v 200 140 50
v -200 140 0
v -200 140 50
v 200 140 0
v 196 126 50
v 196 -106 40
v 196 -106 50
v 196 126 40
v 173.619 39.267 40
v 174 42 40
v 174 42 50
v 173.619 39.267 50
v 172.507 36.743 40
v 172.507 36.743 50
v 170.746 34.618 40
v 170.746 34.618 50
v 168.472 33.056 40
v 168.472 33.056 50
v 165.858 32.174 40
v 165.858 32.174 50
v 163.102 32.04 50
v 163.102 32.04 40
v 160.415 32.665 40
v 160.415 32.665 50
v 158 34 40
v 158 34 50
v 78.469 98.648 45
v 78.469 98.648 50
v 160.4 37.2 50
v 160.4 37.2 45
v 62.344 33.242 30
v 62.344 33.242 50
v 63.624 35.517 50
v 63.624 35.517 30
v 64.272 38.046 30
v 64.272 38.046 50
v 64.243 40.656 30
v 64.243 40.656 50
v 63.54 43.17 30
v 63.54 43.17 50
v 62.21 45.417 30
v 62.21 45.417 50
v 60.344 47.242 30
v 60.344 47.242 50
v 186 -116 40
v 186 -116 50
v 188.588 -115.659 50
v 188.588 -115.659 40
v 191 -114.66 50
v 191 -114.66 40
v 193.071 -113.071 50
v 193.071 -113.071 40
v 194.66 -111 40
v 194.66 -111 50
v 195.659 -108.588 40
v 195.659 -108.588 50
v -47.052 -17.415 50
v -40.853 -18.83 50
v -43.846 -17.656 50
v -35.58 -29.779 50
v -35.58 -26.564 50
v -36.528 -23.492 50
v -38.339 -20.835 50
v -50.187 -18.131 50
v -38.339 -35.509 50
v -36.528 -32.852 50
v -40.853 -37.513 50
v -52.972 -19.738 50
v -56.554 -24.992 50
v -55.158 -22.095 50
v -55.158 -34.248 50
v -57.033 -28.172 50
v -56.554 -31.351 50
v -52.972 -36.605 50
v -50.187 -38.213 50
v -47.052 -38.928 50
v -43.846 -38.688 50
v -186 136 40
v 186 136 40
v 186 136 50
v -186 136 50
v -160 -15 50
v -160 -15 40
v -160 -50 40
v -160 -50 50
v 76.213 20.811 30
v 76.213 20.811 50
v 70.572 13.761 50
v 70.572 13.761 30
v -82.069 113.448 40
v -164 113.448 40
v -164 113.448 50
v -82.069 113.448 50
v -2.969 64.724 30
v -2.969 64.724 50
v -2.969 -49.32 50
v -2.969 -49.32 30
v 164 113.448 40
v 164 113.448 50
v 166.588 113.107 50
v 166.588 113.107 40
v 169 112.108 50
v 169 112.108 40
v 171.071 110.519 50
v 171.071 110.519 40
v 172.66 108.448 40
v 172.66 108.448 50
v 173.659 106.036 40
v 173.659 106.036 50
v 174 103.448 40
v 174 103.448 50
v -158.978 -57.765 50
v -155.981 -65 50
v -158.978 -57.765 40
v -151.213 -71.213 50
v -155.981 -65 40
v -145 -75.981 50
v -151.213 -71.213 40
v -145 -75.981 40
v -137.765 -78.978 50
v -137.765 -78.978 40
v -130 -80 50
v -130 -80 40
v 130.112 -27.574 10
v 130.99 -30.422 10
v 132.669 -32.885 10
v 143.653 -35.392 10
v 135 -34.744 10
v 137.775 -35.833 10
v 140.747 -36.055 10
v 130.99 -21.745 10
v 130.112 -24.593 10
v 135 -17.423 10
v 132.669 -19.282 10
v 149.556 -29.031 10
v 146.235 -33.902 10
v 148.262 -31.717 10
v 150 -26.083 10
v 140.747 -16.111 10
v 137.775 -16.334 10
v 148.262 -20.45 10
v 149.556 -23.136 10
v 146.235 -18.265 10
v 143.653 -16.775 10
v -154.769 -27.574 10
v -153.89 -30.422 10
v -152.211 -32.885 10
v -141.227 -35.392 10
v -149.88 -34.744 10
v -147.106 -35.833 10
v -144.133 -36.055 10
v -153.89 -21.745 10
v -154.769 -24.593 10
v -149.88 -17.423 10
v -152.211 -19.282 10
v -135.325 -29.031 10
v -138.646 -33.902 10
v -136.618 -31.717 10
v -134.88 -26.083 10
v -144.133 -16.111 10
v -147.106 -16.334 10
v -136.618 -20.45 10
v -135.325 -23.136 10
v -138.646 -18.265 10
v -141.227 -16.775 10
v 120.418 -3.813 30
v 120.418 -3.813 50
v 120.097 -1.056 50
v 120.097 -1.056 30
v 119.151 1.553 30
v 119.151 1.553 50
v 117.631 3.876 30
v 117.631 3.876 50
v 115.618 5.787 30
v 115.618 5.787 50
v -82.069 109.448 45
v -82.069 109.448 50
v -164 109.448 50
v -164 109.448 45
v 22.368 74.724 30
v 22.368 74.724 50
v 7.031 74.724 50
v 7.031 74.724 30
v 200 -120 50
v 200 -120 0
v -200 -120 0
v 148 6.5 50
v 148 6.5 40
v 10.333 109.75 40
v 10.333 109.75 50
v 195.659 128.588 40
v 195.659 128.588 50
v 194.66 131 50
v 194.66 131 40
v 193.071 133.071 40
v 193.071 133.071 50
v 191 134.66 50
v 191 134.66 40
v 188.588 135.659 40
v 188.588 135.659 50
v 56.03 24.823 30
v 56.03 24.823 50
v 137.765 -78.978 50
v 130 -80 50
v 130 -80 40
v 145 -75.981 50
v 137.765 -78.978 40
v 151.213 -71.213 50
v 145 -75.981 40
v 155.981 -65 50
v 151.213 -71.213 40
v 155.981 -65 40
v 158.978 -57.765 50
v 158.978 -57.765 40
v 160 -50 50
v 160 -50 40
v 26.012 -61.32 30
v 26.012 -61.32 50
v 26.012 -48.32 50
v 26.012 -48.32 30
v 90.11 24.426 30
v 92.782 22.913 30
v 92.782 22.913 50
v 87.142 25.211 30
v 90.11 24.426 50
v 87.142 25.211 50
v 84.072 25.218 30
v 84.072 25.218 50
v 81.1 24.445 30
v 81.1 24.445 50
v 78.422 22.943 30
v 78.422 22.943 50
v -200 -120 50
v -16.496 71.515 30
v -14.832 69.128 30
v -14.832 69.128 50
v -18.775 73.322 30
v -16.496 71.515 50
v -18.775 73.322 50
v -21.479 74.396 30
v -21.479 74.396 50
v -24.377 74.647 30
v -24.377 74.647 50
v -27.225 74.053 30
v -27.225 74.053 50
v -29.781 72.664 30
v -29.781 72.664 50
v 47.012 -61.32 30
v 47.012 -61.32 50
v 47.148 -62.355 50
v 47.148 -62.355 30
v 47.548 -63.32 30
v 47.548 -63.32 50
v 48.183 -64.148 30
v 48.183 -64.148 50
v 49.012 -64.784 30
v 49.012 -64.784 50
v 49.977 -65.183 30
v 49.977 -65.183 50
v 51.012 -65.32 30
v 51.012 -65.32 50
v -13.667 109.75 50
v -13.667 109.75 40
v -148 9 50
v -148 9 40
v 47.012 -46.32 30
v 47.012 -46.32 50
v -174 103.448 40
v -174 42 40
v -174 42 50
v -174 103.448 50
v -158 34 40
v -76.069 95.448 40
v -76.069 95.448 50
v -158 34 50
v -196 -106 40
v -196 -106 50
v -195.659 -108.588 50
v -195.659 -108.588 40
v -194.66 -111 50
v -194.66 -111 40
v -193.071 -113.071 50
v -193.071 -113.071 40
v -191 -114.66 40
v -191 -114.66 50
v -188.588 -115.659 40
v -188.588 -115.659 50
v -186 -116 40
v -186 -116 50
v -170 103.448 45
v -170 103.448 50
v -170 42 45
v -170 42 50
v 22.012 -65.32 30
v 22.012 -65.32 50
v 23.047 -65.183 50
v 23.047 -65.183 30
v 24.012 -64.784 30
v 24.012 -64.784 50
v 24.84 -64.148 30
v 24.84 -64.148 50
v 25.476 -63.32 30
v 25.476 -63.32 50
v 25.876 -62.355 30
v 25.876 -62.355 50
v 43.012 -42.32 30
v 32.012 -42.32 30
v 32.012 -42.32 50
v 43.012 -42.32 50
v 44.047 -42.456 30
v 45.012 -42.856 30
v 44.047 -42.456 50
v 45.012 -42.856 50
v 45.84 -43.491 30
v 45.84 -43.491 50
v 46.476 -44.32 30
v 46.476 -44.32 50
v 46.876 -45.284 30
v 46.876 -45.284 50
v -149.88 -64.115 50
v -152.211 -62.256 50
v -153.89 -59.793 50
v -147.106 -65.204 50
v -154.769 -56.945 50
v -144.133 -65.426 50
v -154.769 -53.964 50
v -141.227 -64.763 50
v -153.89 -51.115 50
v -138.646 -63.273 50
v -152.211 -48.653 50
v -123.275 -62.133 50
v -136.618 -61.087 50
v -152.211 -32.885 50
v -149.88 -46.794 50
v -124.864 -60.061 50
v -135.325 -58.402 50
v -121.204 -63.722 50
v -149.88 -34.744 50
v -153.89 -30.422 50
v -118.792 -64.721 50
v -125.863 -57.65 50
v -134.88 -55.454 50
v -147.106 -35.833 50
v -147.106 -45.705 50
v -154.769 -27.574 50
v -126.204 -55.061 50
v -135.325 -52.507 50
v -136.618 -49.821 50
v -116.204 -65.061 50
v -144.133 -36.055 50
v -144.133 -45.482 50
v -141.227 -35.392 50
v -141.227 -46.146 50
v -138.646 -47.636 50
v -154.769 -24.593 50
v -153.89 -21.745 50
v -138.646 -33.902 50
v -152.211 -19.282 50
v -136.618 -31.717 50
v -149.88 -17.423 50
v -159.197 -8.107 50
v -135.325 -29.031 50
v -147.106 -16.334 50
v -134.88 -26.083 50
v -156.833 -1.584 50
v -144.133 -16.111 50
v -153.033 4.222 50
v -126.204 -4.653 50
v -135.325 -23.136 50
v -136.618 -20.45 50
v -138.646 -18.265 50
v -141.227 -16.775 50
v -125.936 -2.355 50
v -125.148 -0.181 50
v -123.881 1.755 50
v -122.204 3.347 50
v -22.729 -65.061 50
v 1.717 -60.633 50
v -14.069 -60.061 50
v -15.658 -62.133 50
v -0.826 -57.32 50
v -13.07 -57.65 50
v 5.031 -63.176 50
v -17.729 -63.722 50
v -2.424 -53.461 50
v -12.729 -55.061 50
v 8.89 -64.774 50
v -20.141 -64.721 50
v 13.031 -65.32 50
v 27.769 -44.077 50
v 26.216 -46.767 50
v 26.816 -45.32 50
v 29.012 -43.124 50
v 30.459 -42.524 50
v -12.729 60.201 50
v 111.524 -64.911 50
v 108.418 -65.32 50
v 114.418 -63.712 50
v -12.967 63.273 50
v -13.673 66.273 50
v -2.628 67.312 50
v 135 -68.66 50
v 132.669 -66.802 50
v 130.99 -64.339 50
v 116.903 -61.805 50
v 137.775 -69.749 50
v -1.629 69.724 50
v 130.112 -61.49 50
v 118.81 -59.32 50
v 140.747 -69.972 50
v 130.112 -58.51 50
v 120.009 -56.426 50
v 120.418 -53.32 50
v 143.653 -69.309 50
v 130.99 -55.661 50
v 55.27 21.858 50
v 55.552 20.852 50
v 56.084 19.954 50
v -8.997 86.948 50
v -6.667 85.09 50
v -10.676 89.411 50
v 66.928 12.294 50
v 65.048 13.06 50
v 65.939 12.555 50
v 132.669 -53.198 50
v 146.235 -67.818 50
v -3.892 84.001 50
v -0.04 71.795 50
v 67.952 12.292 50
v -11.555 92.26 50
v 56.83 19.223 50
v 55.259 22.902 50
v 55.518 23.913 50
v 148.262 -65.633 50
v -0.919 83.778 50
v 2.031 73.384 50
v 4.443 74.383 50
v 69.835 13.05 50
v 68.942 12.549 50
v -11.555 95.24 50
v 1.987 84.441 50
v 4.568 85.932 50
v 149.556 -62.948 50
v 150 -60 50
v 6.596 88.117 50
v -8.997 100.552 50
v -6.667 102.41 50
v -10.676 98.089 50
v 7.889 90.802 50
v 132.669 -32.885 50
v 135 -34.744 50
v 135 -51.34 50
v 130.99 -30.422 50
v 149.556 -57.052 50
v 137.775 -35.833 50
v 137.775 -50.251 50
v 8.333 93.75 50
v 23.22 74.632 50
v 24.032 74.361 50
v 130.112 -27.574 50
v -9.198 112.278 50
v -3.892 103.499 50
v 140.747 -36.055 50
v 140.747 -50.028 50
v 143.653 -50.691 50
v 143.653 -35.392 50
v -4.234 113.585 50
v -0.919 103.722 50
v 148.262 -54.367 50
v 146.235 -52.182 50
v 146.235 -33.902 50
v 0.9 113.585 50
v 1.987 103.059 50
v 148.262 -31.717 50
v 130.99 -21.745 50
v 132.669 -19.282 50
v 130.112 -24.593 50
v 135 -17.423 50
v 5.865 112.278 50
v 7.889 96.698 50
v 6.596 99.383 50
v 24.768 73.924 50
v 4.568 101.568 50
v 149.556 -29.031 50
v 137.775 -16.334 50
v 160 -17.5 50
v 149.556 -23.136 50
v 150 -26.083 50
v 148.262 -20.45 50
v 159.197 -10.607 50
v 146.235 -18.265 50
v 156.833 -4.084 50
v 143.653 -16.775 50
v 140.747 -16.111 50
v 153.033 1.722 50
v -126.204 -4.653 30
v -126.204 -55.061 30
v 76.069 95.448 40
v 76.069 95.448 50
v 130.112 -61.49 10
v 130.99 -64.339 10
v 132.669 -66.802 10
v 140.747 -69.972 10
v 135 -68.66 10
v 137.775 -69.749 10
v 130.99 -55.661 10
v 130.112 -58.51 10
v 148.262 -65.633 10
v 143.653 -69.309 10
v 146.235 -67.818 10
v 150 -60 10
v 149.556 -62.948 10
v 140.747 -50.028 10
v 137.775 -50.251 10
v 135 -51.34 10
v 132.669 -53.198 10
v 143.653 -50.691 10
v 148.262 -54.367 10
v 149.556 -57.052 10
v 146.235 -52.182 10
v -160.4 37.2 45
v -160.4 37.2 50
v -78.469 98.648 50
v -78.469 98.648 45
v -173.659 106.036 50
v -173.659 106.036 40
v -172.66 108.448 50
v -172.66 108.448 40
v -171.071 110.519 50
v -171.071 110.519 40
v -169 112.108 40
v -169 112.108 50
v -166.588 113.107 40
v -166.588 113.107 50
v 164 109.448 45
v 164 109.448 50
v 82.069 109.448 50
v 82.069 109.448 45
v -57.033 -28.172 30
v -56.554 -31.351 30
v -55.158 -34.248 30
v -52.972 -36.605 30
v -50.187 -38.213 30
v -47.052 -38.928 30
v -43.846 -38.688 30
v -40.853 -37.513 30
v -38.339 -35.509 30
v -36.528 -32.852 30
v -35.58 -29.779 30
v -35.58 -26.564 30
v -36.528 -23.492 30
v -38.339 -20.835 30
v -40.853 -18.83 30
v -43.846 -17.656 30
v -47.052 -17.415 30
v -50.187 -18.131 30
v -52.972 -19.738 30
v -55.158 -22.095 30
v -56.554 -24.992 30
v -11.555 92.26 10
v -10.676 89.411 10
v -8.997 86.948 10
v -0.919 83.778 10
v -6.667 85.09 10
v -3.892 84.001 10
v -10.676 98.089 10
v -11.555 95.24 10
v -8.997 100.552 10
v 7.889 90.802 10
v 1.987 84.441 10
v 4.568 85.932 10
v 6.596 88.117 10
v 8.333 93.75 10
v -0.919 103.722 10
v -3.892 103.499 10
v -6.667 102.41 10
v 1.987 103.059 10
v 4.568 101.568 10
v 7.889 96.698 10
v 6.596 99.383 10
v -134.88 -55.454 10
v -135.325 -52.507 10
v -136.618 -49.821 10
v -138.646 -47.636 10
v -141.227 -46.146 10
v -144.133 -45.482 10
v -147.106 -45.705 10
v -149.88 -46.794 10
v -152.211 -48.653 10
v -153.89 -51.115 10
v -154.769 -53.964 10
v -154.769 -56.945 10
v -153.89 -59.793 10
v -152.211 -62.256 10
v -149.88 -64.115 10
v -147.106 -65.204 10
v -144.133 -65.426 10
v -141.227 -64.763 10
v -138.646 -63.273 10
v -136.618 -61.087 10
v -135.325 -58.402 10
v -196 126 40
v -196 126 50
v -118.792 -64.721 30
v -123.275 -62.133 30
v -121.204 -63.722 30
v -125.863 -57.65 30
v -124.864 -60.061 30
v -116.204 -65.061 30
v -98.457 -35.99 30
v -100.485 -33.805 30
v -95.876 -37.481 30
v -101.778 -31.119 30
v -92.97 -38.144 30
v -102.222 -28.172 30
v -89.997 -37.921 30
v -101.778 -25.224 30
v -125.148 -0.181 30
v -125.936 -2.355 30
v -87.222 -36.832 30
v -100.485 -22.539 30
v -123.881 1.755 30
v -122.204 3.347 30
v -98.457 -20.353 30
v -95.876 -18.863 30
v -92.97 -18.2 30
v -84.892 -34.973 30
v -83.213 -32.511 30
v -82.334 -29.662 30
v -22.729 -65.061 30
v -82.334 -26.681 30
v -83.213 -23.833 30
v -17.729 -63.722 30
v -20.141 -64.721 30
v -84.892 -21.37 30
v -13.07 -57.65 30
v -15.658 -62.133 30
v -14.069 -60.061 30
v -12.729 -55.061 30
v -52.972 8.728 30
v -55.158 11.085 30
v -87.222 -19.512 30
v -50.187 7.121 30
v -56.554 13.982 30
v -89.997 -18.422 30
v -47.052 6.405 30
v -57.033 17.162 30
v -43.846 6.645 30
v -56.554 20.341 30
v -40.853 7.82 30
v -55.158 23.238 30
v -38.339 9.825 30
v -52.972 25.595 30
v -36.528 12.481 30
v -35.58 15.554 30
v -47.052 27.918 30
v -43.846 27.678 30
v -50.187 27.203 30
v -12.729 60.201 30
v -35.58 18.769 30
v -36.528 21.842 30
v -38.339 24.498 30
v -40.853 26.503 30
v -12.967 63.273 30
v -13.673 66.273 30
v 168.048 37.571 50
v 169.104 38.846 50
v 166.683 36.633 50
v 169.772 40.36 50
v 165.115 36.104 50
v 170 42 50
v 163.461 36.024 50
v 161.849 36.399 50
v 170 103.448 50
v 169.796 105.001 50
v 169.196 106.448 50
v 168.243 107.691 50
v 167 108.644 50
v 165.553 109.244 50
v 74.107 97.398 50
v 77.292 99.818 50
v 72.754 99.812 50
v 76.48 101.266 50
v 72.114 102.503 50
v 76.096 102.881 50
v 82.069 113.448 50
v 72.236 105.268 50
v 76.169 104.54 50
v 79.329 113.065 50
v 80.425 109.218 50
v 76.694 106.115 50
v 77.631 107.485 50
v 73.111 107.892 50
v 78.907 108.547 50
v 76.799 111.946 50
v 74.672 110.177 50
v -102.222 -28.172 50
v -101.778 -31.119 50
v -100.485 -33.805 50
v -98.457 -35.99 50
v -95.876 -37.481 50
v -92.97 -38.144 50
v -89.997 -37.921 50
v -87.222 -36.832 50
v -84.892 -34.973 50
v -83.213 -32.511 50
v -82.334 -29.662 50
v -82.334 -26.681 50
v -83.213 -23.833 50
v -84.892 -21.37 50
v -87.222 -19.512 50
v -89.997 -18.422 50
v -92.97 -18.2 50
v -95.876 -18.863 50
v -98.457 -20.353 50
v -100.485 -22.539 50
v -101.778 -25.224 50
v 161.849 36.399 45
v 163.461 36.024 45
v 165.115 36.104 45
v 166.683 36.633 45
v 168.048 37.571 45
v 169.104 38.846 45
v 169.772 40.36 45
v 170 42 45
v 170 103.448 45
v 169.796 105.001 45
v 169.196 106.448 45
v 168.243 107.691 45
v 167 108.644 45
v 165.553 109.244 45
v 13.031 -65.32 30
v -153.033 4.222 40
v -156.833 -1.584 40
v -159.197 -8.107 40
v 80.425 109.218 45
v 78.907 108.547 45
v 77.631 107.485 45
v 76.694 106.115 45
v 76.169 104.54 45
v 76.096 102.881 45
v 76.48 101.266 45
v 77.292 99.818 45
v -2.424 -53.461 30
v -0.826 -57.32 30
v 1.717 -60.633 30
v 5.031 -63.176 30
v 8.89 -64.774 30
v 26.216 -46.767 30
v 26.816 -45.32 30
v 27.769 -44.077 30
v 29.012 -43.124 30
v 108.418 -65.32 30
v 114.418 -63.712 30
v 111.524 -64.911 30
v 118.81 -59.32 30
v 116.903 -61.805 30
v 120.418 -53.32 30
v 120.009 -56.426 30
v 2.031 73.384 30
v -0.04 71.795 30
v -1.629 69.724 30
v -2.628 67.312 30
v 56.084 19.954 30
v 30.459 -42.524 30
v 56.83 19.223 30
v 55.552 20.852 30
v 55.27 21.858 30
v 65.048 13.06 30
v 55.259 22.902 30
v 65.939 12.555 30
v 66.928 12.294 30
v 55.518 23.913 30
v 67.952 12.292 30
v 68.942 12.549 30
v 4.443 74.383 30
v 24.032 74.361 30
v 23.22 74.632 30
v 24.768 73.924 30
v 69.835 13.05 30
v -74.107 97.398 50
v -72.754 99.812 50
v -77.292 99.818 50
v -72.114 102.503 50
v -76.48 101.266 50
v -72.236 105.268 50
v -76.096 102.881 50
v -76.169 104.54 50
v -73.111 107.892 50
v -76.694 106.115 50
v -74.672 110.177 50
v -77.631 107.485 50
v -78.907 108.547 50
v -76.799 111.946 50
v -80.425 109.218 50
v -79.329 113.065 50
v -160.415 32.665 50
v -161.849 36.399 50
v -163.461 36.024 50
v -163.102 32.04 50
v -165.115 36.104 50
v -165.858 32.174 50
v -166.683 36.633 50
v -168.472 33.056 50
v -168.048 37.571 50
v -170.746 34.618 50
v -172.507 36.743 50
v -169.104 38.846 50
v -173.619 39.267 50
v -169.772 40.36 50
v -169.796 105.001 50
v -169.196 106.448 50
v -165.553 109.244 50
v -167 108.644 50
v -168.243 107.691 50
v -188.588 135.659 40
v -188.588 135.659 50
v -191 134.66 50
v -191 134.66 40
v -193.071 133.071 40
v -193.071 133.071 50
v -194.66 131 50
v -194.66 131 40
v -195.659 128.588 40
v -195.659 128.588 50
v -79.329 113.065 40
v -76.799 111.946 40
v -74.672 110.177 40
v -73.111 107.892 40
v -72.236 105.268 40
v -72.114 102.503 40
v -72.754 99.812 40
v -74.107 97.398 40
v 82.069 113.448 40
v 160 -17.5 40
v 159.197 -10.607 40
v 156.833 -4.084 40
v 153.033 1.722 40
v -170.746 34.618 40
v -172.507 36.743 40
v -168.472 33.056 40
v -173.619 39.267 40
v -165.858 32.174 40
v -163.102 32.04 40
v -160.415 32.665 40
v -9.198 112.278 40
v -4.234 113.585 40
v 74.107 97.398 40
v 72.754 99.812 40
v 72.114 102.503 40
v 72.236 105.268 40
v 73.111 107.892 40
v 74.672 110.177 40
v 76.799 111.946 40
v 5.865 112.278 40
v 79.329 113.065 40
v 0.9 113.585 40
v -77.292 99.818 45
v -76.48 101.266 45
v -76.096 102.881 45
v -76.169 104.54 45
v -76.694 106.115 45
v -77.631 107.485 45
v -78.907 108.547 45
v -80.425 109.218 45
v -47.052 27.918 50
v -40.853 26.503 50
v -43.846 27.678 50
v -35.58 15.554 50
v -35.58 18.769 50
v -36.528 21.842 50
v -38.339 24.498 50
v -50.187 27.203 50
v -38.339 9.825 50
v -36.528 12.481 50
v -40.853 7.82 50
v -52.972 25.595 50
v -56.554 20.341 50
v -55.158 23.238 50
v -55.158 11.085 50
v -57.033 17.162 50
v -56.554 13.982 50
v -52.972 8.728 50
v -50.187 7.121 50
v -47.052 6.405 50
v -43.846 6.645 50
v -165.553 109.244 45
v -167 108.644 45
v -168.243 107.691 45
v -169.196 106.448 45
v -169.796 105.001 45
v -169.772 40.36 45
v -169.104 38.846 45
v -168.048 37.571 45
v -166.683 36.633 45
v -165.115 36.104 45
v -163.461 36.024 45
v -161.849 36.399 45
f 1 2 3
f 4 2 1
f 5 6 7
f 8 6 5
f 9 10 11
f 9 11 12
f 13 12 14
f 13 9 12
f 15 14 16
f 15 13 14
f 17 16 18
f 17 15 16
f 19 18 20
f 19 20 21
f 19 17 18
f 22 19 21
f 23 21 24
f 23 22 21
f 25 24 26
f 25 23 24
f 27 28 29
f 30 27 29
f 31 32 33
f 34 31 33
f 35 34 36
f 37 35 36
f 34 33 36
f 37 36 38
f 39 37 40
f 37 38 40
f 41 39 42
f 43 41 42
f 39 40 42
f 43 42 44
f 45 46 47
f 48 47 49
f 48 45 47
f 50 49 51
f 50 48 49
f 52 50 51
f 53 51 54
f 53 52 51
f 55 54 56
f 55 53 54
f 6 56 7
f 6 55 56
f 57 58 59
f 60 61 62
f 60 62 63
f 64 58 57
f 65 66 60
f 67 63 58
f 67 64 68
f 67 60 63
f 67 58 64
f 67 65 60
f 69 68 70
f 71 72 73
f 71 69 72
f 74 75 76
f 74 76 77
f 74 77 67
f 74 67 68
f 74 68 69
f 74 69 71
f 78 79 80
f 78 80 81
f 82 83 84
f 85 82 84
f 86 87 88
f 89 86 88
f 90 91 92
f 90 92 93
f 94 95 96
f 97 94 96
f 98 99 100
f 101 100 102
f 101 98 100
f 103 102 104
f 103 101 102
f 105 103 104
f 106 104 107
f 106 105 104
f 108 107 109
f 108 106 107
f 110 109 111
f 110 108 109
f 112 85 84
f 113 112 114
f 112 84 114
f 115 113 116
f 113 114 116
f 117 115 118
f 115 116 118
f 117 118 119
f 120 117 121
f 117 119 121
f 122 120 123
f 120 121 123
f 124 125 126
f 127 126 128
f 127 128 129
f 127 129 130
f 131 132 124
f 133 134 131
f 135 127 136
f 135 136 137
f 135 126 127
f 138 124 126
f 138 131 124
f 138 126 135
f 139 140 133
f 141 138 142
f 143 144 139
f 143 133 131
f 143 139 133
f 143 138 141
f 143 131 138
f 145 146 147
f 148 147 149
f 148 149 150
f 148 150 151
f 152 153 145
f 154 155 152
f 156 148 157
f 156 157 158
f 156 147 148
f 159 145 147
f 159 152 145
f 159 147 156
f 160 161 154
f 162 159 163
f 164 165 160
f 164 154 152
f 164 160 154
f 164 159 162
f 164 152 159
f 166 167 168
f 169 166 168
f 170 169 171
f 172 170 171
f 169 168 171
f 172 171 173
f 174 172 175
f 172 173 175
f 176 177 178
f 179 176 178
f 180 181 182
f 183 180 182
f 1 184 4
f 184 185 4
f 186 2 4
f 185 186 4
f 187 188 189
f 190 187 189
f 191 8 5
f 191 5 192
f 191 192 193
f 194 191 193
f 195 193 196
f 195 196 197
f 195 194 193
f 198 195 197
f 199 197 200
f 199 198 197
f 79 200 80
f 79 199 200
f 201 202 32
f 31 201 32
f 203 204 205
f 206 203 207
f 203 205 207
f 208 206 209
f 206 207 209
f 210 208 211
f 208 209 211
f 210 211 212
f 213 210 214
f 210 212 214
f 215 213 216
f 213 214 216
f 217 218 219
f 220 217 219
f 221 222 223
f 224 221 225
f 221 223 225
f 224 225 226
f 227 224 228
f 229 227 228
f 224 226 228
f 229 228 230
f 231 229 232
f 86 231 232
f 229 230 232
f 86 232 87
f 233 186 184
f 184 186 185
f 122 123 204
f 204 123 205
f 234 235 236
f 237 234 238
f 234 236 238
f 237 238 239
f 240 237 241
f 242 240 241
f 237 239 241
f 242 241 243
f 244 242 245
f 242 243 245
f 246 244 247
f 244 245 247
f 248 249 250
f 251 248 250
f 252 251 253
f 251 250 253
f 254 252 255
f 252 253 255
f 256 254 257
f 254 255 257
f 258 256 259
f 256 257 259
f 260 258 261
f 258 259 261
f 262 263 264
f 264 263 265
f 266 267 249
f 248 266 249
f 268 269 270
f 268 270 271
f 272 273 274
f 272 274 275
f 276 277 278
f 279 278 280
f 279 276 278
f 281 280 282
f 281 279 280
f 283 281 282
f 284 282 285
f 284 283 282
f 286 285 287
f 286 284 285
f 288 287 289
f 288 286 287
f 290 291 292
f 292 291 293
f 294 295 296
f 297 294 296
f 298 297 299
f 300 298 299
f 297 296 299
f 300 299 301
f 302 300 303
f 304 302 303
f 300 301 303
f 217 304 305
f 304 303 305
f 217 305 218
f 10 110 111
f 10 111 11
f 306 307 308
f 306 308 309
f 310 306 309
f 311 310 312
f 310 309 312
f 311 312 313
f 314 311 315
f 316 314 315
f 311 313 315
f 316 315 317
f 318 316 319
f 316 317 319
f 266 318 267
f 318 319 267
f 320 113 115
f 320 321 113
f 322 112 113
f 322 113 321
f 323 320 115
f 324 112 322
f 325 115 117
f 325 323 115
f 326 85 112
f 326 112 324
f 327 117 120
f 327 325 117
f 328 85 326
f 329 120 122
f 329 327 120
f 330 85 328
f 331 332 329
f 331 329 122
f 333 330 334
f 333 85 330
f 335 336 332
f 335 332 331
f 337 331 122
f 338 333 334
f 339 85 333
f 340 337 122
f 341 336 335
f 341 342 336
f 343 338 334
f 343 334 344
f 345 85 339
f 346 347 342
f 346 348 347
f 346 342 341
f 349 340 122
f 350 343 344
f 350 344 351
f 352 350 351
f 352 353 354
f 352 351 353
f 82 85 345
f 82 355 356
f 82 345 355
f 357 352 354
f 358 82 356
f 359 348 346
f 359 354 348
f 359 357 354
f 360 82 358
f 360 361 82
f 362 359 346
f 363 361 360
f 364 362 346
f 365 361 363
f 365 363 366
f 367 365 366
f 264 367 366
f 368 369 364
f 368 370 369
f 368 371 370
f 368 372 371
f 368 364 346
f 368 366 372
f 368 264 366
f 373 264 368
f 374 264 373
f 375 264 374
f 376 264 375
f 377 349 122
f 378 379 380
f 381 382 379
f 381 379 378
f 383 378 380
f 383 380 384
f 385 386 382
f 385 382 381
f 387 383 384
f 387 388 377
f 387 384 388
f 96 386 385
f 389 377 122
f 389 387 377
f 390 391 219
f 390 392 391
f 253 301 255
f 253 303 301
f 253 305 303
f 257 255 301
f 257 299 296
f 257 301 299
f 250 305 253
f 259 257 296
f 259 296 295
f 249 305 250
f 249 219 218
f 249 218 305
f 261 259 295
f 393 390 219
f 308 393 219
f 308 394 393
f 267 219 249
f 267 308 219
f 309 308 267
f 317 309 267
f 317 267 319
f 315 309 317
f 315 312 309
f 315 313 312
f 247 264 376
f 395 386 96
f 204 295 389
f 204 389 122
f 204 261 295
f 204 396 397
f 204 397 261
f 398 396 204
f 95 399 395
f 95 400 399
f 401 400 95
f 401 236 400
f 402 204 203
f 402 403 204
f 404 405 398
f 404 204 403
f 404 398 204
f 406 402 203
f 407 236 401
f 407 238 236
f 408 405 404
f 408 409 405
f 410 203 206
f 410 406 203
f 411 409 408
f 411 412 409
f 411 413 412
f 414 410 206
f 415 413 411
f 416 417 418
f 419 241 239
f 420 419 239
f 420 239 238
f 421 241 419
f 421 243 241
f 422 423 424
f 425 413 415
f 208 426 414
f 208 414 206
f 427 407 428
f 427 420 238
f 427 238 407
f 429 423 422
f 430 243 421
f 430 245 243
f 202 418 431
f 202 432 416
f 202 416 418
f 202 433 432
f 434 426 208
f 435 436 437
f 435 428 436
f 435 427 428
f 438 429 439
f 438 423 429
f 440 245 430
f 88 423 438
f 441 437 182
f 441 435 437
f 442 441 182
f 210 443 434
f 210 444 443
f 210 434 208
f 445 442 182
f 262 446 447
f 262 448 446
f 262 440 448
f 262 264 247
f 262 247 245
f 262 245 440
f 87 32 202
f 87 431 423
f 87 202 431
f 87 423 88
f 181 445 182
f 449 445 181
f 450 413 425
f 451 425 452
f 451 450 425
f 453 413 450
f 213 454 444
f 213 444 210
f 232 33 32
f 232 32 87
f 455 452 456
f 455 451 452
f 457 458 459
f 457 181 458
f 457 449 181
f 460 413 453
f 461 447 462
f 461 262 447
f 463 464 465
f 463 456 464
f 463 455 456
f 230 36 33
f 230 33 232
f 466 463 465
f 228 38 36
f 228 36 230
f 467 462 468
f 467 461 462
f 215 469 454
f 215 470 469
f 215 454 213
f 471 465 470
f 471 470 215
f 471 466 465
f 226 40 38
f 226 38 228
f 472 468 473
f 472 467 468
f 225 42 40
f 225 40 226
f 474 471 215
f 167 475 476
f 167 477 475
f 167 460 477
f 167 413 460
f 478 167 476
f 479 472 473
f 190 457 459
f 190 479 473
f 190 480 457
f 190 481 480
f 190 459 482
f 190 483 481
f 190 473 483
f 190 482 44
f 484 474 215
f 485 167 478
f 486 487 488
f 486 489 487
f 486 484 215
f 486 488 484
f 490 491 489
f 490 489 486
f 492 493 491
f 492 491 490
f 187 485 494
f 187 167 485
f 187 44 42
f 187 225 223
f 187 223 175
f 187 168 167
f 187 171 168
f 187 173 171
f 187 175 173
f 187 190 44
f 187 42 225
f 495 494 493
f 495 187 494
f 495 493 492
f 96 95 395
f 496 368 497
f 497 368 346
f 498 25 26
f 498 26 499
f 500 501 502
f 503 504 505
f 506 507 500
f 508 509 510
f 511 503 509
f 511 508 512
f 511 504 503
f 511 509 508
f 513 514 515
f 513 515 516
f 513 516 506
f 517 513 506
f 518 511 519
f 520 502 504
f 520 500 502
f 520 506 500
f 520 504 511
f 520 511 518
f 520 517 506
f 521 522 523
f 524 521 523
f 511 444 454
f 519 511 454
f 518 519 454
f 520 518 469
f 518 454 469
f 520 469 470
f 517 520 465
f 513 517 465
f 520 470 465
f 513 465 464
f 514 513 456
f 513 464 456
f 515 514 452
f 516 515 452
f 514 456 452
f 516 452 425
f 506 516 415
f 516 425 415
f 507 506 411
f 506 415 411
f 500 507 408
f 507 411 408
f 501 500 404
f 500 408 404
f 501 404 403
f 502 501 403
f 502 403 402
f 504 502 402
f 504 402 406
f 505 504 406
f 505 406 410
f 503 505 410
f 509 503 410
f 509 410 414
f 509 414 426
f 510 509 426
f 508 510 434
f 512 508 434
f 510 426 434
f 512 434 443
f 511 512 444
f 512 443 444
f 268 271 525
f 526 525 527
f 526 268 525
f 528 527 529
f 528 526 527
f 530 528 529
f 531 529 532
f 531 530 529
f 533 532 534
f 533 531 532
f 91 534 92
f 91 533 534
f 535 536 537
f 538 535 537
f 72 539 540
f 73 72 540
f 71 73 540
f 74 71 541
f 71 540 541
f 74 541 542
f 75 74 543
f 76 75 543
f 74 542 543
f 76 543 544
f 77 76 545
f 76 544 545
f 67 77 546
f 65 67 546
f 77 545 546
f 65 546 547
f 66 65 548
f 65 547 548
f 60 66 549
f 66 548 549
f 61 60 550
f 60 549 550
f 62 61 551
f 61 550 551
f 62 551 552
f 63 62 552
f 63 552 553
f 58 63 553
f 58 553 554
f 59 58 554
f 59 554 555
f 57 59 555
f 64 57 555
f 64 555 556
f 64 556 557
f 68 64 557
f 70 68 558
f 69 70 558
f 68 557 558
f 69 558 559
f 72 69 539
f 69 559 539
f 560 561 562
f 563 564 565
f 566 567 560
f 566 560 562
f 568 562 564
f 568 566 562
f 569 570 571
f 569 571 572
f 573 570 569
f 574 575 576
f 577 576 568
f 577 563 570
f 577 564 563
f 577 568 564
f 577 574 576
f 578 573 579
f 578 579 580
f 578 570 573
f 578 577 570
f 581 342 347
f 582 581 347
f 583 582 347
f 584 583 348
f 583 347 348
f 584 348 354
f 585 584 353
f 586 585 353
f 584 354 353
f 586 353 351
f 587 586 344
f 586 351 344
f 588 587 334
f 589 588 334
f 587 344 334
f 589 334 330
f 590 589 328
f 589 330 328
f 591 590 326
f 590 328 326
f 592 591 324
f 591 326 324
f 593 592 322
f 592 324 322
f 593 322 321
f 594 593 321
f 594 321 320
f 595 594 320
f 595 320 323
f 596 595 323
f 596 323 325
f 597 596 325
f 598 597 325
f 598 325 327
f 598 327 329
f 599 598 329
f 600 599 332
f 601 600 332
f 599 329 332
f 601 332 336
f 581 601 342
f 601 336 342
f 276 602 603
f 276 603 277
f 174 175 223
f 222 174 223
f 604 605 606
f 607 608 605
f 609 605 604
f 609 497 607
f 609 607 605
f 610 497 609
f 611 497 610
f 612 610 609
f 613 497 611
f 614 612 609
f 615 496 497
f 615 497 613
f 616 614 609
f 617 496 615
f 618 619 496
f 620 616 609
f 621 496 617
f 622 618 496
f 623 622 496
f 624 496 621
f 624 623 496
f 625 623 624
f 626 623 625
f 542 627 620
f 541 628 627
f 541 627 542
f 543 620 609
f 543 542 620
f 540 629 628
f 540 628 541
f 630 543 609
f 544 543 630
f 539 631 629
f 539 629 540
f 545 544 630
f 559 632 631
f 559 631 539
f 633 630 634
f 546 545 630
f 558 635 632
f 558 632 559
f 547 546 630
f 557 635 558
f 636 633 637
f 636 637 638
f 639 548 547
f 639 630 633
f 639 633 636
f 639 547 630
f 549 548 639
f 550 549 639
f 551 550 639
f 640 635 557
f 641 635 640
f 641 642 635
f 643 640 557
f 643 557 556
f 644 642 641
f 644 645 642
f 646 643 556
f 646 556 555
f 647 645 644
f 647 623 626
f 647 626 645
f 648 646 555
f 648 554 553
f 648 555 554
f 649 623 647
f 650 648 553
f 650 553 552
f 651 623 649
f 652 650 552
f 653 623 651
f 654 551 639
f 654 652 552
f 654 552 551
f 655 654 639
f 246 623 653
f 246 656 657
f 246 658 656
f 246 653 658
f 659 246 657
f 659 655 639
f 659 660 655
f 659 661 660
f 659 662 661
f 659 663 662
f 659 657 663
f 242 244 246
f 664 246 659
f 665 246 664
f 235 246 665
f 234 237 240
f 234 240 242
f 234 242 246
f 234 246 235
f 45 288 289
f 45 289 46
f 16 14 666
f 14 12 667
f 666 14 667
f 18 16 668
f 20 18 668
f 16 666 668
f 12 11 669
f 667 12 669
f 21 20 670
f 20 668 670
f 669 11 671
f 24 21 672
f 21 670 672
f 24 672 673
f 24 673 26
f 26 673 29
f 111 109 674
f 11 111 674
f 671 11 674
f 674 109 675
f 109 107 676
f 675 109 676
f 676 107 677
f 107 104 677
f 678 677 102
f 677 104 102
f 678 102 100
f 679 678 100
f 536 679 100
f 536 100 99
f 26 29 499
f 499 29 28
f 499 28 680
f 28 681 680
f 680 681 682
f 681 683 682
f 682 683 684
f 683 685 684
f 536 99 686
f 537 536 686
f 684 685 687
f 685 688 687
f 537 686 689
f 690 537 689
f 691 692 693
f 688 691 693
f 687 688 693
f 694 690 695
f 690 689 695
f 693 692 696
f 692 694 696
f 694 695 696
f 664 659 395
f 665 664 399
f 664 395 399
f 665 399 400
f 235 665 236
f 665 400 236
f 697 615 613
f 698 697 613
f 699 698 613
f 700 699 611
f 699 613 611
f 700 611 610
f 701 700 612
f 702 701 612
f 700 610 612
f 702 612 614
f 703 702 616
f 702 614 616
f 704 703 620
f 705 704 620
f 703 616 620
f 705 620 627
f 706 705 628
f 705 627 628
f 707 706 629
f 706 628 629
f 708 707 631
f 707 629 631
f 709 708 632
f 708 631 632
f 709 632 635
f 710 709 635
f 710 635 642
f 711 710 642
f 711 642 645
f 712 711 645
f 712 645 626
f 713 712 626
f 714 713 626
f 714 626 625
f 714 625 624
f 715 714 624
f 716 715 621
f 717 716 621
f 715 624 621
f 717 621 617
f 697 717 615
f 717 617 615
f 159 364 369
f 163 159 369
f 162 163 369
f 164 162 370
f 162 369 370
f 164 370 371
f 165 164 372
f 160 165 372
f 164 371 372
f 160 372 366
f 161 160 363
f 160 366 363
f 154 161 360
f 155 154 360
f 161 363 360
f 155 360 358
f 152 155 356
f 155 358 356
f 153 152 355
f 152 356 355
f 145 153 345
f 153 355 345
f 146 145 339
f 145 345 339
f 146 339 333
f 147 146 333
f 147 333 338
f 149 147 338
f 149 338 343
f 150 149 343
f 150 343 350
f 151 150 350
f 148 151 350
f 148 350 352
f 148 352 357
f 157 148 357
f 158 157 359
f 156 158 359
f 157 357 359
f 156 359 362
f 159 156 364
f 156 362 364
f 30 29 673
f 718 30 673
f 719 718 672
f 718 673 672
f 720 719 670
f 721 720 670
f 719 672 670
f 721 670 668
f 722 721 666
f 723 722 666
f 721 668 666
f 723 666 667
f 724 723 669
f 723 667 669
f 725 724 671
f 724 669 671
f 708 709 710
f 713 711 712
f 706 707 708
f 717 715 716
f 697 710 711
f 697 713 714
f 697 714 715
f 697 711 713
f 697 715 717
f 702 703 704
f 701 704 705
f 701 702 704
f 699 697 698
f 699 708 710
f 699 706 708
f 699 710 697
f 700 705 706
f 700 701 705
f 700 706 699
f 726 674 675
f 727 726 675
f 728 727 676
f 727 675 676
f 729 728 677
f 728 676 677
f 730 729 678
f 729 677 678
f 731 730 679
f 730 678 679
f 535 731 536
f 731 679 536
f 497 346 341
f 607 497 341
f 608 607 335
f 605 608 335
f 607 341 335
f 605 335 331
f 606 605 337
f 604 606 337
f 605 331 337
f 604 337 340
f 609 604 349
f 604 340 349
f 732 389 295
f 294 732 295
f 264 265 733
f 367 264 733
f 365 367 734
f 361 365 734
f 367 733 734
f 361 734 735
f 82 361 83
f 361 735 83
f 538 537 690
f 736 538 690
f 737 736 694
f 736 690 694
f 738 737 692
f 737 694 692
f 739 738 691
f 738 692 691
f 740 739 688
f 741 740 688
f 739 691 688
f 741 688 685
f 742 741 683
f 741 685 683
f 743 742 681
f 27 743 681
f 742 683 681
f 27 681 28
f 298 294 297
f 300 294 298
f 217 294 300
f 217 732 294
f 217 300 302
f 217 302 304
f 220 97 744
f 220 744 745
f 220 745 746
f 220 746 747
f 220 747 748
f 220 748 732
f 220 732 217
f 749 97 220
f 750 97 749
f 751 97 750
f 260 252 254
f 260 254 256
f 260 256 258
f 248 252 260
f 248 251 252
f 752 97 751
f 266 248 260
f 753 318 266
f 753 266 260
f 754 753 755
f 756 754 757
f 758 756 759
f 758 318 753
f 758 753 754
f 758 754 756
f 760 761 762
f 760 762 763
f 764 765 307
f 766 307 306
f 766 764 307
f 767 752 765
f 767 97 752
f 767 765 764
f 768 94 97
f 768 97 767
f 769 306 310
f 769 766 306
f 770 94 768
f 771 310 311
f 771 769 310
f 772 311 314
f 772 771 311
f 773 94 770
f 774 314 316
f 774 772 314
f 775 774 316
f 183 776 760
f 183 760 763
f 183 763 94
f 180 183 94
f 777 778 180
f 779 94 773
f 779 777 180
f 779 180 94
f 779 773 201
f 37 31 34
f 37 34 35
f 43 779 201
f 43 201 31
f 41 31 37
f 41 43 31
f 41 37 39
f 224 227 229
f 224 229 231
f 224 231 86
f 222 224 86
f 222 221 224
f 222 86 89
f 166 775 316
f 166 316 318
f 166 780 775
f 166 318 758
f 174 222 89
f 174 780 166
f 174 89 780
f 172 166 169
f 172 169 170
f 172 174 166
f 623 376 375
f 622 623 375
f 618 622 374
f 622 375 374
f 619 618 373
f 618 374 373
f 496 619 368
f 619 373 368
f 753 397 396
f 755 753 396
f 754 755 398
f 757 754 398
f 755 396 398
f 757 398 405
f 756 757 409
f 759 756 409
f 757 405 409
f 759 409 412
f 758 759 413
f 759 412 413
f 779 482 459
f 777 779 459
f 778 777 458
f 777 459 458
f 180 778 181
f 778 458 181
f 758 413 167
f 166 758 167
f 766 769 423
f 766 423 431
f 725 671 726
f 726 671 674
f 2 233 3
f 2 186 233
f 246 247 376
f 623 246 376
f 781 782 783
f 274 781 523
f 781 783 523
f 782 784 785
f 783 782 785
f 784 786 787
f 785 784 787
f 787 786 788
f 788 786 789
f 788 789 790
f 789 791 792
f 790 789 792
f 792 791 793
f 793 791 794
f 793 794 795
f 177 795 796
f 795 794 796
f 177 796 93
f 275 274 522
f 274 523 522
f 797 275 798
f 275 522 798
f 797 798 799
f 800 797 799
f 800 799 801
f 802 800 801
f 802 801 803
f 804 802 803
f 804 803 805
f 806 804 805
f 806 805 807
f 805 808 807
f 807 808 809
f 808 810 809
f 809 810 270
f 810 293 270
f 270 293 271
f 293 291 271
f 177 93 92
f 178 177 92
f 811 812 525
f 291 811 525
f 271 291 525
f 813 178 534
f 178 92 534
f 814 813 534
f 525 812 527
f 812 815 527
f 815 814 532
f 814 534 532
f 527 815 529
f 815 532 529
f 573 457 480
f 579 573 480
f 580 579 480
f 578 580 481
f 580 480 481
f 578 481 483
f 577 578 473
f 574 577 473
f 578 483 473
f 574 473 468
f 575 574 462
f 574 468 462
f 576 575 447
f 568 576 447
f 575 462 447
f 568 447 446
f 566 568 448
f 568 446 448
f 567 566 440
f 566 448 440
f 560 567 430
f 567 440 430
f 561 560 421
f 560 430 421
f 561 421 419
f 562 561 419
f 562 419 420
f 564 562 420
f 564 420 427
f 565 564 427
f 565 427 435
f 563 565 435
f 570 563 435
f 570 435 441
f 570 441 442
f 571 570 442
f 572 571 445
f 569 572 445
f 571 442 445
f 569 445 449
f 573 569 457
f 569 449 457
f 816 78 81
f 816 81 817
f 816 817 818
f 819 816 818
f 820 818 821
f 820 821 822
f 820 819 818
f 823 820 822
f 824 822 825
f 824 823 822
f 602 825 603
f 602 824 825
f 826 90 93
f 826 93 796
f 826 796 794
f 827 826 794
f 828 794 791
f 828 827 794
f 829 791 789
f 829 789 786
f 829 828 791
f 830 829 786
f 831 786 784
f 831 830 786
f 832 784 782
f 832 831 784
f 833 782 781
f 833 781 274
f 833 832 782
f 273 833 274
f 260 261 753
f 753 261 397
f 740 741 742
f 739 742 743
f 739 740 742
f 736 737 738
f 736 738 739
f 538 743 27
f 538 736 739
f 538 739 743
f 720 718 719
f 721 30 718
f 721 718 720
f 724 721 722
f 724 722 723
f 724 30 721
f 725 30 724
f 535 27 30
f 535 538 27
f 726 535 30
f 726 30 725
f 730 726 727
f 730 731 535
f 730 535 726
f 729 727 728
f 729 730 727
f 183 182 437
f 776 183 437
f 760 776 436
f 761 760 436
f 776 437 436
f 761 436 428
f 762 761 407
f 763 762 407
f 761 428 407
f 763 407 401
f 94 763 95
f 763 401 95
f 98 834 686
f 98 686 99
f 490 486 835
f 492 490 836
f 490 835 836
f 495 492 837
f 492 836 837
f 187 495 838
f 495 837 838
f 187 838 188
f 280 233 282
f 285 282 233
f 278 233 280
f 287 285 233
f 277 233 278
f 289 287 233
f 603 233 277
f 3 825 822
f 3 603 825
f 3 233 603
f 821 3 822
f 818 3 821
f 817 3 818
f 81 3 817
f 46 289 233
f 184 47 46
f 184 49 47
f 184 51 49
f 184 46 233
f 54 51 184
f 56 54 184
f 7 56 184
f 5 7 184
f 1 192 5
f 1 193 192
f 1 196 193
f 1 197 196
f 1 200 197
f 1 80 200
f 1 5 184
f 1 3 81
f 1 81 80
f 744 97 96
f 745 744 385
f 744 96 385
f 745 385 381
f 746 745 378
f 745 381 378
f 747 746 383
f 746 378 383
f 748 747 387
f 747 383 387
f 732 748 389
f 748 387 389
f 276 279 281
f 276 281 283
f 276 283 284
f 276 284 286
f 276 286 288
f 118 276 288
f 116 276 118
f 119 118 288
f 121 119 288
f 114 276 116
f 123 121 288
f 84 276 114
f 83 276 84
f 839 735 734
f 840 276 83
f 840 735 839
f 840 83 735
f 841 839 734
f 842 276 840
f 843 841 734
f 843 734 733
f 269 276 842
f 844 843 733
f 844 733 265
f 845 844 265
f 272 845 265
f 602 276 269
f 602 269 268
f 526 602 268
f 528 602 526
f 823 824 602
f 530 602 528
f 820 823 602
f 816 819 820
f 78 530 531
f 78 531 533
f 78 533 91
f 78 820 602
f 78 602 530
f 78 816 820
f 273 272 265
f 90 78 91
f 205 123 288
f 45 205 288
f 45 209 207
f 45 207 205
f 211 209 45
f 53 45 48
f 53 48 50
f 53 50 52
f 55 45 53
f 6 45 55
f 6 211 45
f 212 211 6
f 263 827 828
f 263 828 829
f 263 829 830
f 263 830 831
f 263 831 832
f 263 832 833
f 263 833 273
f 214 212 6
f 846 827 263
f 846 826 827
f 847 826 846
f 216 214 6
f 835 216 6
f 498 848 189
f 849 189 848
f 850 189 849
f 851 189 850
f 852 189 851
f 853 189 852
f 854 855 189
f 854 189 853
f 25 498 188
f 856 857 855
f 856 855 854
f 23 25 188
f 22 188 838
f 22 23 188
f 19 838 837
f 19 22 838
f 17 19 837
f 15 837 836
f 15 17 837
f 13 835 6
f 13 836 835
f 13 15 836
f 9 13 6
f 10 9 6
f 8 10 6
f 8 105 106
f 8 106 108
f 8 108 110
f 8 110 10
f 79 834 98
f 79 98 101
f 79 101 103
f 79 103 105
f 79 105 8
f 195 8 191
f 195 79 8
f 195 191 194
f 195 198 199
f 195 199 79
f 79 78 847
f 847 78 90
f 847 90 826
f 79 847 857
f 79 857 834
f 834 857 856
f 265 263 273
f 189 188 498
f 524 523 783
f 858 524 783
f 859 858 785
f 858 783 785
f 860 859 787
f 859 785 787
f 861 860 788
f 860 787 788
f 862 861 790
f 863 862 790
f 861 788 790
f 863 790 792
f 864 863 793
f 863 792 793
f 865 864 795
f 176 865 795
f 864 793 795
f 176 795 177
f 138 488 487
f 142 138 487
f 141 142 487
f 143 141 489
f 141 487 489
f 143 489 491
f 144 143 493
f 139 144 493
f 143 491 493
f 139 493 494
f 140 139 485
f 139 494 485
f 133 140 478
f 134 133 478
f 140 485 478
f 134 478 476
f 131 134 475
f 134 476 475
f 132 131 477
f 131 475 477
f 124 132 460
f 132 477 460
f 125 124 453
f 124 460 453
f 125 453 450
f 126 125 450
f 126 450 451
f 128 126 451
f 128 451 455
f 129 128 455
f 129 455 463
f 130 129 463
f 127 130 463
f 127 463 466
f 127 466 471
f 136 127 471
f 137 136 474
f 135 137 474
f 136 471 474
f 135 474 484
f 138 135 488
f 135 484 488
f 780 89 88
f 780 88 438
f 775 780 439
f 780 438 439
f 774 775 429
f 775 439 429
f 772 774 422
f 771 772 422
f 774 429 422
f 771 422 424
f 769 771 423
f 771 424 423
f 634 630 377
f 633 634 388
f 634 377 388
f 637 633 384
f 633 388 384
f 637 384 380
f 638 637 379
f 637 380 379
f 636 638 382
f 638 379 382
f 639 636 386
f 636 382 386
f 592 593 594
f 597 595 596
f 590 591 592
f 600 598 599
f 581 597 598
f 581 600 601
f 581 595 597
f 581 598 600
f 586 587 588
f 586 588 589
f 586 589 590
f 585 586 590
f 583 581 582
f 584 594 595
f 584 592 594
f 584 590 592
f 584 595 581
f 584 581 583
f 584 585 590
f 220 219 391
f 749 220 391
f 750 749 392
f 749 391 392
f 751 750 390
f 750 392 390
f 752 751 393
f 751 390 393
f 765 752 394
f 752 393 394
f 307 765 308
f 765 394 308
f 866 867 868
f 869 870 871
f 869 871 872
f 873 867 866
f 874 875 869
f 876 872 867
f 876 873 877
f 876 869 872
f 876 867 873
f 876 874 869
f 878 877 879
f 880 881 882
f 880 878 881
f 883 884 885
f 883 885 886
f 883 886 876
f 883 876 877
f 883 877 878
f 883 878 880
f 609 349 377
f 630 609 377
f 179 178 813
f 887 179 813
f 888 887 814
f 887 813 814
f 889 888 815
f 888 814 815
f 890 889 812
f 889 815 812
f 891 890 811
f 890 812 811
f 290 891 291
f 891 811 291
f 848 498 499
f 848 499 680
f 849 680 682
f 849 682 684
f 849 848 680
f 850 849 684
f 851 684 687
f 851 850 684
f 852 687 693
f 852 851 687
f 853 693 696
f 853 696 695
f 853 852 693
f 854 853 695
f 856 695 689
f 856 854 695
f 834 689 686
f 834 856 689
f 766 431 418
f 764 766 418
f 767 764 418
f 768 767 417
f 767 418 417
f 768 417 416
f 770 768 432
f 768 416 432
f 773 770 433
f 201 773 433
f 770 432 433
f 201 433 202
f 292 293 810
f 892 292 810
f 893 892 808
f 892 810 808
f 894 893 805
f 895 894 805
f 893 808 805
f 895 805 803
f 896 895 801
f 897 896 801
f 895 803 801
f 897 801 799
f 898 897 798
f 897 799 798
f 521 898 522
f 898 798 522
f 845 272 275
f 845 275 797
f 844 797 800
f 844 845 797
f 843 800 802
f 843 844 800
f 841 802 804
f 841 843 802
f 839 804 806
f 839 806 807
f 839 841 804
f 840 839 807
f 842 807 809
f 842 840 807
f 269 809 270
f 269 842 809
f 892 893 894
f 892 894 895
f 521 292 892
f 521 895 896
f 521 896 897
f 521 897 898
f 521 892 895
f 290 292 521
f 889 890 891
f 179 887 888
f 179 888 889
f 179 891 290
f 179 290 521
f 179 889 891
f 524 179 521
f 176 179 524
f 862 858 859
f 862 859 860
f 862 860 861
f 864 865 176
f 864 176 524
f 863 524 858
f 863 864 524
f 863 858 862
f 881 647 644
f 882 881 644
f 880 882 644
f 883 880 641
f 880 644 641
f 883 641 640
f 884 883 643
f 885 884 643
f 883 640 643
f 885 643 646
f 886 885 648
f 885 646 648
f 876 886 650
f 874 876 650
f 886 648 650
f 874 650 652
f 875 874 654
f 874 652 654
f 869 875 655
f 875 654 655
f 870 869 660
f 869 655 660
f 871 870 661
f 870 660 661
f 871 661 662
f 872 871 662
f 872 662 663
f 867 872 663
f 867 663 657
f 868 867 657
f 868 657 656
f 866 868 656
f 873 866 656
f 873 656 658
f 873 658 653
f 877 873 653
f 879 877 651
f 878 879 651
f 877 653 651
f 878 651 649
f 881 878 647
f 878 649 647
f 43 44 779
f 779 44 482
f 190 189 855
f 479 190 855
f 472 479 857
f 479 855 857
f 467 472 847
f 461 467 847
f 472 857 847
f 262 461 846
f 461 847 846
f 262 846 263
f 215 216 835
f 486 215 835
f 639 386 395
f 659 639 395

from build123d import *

# Parameters (mm, degrees)
BASE_TRIANGLE_DEPTH  = 50
SKETCH5_W            = 400
SKETCH5_H            = 260
BASE_RECTANGLE_DEPTH = 40
POCKETS_DEPTH        = 20
SKETCH3_R            = 10
CUT_HOLES_DEPTH      = 40
SKETCH4_R            = 10.786602673
SKETCH4_R_2          = 10
POCKET_BOSS_DEPTH    = 20
SKETCH6_W            = 400
SKETCH6_H            = 260
RIM_DEPTH            = 10
TRI_BOSS_DEPTH       = 10
TRI_POCK_S_DEPTH     = 5


with BuildPart() as part:
    # Sketch1 → Base - Triangle (new body)
    with BuildSketch(Plane.XY):
        with BuildLine():
            Line((-13.666666667, 109.75), (-148, 9))
            ThreePointArc((-148, 9), (-156.83281573, -1.583592135), (-160, -15))
            Line((-160, -15), (-160, -50))
            ThreePointArc((-160, -50), (-151.213203436, -71.213203436), (-130, -80))
            Line((-130, -80), (130, -80))
            ThreePointArc((130, -80), (151.213203436, -71.213203436), (160, -50))
            Line((160, -50), (160, -17.5))
            ThreePointArc((160, -17.5), (156.83281573, -4.083592135), (148, 6.5))
            Line((148, 6.5), (10.333333333, 109.75))
            ThreePointArc((10.333333333, 109.75), (-1.666666667, 113.75), (-13.666666667, 109.75))
        make_face()
    extrude(amount=BASE_TRIANGLE_DEPTH)

    # Sketch5 → Base - Rectangle (add)
    with BuildSketch(Plane.XY):
        with Locations((0, 10)):
            Rectangle(SKETCH5_W, SKETCH5_H)
    extrude(amount=BASE_RECTANGLE_DEPTH)

    # Sketch2 → Pockets (cut)
    with BuildSketch(Plane.XY.offset(50)):
        with BuildLine():
            Line((-126.20392244, -4.65294183), (-126.20392244, -55.061436747))
            ThreePointArc((-126.20392244, -55.061436747), (-123.274990252, -62.132504559), (-116.20392244, -65.061436747))
            Line((-116.20392244, -65.061436747), (-22.729187789, -65.061436747))
            ThreePointArc((-22.729187789, -65.061436747), (-15.658119977, -62.132504559), (-12.729187789, -55.061436747))
            Line((-12.729187789, -55.061436747), (-12.729187789, 60.20056332))
            ThreePointArc((-12.729187789, 60.20056332), (-13.262082788, 64.786609863), (-14.832370079, 69.12826828))
            ThreePointArc((-14.832370079, 69.12826828), (-21.478744287, 74.395841003), (-29.780778934, 72.6644158))
            Line((-29.780778934, 72.6644158), (-122.20392244, 3.34705817))
            ThreePointArc((-122.20392244, 3.34705817), (-125.14819435, -0.180805875), (-126.20392244, -4.65294183))
        make_face()
        with BuildLine():
            Line((-2.969097688, 64.72393548), (-2.969097688, -49.319676422))
            ThreePointArc((-2.969097688, -49.319676422), (1.717193813, -60.633384921), (13.030902312, -65.319676422))
            Line((13.030902312, -65.319676422), (22.011923396, -65.319676422))
            ThreePointArc((22.011923396, -65.319676422), (24.840350521, -64.148103547), (26.011923396, -61.319676422))
            Line((26.011923396, -61.319676422), (26.011923396, -48.319676422))
            ThreePointArc((26.011923396, -48.319676422), (27.769282709, -44.077035735), (32.011923396, -42.319676422))
            Line((32.011923396, -42.319676422), (43.011923396, -42.319676422))
            ThreePointArc((43.011923396, -42.319676422), (45.840350521, -43.491249298), (47.011923396, -46.319676422))
            Line((47.011923396, -46.319676422), (47.011923396, -61.319676422))
            ThreePointArc((47.011923396, -61.319676422), (48.183496271, -64.148103547), (51.011923396, -65.319676422))
            Line((51.011923396, -65.319676422), (108.417947751, -65.319676422))
            ThreePointArc((108.417947751, -65.319676422), (116.903229125, -61.804957797), (120.417947751, -53.319676422))
            Line((120.417947751, -53.319676422), (120.417947751, -3.813460813))
            ThreePointArc((120.417947751, -3.813460813), (119.151074043, 1.553102333), (115.617947751, 5.786539187))
            Line((115.617947751, 5.786539187), (92.782280857, 22.913289357))
            ThreePointArc((92.782280857, 22.913289357), (84.071541357, 25.217812286), (76.212563172, 20.810514877))
            Line((76.212563172, 20.810514877), (70.571566089, 13.760633559))
            ThreePointArc((70.571566089, 13.760633559), (67.951906694, 12.291534423), (65.04832686, 13.059708732))
            Line((65.04832686, 13.059708732), (56.830014172, 19.223443248))
            ThreePointArc((56.830014172, 19.223443248), (55.270216198, 21.857757823), (56.030014172, 24.823443248))
            Line((56.030014172, 24.823443248), (62.343956311, 33.242032767))
            ThreePointArc((62.343956311, 33.242032767), (64.243451248, 40.656246329), (60.343956311, 47.242032767))
            Line((60.343956311, 47.242032767), (24.768086026, 73.92393548))
            ThreePointArc((24.768086026, 73.92393548), (23.63299709, 74.518668672), (22.368086026, 74.72393548))
            Line((22.368086026, 74.72393548), (7.030902312, 74.72393548))
            ThreePointArc((7.030902312, 74.72393548), (-0.0401655, 71.795003292), (-2.969097688, 64.72393548))
        make_face()
    extrude(amount=-POCKETS_DEPTH, mode=Mode.SUBTRACT)

    # Sketch3 → Cut - Holes (cut)
    with BuildSketch(Plane.XY.offset(50)):
        with Locations((-144.880429534, -26.083370712)):
            Circle(SKETCH3_R)
        with Locations((-144.880429534, -55.454261033)):
            Circle(SKETCH3_R)
        with Locations((140, -26.083370712)):
            Circle(SKETCH3_R)
        with Locations((140, -60)):
            Circle(SKETCH3_R)
        with Locations((-1.666666667, 93.75)):
            Circle(SKETCH3_R)
    extrude(amount=-CUT_HOLES_DEPTH, mode=Mode.SUBTRACT)

    # Sketch4 → Pocket Boss' (add)
    with BuildSketch(Plane.XY.offset(30)):
        with Locations((-46.246176072, 17.161613861)):
            Circle(SKETCH4_R)
        with Locations((-46.246176072, -28.171767173)):
            Circle(SKETCH4_R)
        with Locations((-92.222494778, -28.171767173)):
            Circle(SKETCH4_R_2)
    extrude(amount=POCKET_BOSS_DEPTH)

    # Sketch6 → Rim (add)
    with BuildSketch(Plane.XY.offset(40)):
        with Locations((0, 10)):
            Rectangle(SKETCH6_W, SKETCH6_H)
        with BuildLine():
            Line((-196, 126), (-196, -106))
            ThreePointArc((-196, -106), (-193.071067812, -113.071067812), (-186, -116))
            Line((-186, -116), (186, -116))
            ThreePointArc((186, -116), (193.071067812, -113.071067812), (196, -106))
            Line((196, -106), (196, 126))
            ThreePointArc((196, 126), (193.071067812, 133.071067812), (186, 136))
            Line((186, 136), (-186, 136))
            ThreePointArc((-186, 136), (-193.071067812, 133.071067812), (-196, 126))
        make_face(mode=Mode.SUBTRACT)
    extrude(amount=RIM_DEPTH)

    # Sketch7 → Tri - Boss' (add)
    with BuildSketch(Plane.XY.offset(40)):
        with BuildLine():
            Line((-164, 113.448068866), (-82.069241512, 113.448068866))
            ThreePointArc((-82.069241512, 113.448068866), (-72.582408532, 106.610346526), (-76.069241512, 95.448068866))
            Line((-76.069241512, 95.448068866), (-158, 34))
            ThreePointArc((-158, 34), (-168.472135955, 33.05572809), (-174, 42))
            Line((-174, 42), (-174, 103.448068866))
            ThreePointArc((-174, 103.448068866), (-171.071067812, 110.519136678), (-164, 113.448068866))
        make_face()
        with BuildLine():
            Line((158, 34), (76.069241512, 95.448068866))
            ThreePointArc((76.069241512, 95.448068866), (72.582408532, 106.610346526), (82.069241512, 113.448068866))
            Line((82.069241512, 113.448068866), (164, 113.448068866))
            ThreePointArc((164, 113.448068866), (171.071067812, 110.519136678), (174, 103.448068866))
            Line((174, 103.448068866), (174, 42))
            ThreePointArc((174, 42), (168.472135955, 33.05572809), (158, 34))
        make_face()
    extrude(amount=TRI_BOSS_DEPTH)

    # Sketch8 → Tri - Pock's (cut)
    with BuildSketch(Plane.XY.offset(50)):
        with BuildLine():
            Line((-82.069241512, 109.448068866), (-164, 109.448068866))
            ThreePointArc((-164, 109.448068866), (-168.242640687, 107.690709553), (-170, 103.448068866))
            Line((-170, 103.448068866), (-170, 42))
            ThreePointArc((-170, 42), (-166.683281573, 36.633436854), (-160.4, 37.2))
            Line((-160.4, 37.2), (-78.469241512, 98.648068866))
            ThreePointArc((-78.469241512, 98.648068866), (-76.377141724, 105.345435462), (-82.069241512, 109.448068866))
        make_face()
        with BuildLine():
            Line((170, 42), (170, 103.448068866))
            ThreePointArc((170, 103.448068866), (168.242640687, 107.690709553), (164, 109.448068866))
            Line((164, 109.448068866), (82.069241512, 109.448068866))
            ThreePointArc((82.069241512, 109.448068866), (76.377141724, 105.345435462), (78.469241512, 98.648068866))
            Line((78.469241512, 98.648068866), (160.4, 37.2))
            ThreePointArc((160.4, 37.2), (166.683281573, 36.633436854), (170, 42))
        make_face()
    extrude(amount=-TRI_POCK_S_DEPTH, mode=Mode.SUBTRACT)


solid = part.part
